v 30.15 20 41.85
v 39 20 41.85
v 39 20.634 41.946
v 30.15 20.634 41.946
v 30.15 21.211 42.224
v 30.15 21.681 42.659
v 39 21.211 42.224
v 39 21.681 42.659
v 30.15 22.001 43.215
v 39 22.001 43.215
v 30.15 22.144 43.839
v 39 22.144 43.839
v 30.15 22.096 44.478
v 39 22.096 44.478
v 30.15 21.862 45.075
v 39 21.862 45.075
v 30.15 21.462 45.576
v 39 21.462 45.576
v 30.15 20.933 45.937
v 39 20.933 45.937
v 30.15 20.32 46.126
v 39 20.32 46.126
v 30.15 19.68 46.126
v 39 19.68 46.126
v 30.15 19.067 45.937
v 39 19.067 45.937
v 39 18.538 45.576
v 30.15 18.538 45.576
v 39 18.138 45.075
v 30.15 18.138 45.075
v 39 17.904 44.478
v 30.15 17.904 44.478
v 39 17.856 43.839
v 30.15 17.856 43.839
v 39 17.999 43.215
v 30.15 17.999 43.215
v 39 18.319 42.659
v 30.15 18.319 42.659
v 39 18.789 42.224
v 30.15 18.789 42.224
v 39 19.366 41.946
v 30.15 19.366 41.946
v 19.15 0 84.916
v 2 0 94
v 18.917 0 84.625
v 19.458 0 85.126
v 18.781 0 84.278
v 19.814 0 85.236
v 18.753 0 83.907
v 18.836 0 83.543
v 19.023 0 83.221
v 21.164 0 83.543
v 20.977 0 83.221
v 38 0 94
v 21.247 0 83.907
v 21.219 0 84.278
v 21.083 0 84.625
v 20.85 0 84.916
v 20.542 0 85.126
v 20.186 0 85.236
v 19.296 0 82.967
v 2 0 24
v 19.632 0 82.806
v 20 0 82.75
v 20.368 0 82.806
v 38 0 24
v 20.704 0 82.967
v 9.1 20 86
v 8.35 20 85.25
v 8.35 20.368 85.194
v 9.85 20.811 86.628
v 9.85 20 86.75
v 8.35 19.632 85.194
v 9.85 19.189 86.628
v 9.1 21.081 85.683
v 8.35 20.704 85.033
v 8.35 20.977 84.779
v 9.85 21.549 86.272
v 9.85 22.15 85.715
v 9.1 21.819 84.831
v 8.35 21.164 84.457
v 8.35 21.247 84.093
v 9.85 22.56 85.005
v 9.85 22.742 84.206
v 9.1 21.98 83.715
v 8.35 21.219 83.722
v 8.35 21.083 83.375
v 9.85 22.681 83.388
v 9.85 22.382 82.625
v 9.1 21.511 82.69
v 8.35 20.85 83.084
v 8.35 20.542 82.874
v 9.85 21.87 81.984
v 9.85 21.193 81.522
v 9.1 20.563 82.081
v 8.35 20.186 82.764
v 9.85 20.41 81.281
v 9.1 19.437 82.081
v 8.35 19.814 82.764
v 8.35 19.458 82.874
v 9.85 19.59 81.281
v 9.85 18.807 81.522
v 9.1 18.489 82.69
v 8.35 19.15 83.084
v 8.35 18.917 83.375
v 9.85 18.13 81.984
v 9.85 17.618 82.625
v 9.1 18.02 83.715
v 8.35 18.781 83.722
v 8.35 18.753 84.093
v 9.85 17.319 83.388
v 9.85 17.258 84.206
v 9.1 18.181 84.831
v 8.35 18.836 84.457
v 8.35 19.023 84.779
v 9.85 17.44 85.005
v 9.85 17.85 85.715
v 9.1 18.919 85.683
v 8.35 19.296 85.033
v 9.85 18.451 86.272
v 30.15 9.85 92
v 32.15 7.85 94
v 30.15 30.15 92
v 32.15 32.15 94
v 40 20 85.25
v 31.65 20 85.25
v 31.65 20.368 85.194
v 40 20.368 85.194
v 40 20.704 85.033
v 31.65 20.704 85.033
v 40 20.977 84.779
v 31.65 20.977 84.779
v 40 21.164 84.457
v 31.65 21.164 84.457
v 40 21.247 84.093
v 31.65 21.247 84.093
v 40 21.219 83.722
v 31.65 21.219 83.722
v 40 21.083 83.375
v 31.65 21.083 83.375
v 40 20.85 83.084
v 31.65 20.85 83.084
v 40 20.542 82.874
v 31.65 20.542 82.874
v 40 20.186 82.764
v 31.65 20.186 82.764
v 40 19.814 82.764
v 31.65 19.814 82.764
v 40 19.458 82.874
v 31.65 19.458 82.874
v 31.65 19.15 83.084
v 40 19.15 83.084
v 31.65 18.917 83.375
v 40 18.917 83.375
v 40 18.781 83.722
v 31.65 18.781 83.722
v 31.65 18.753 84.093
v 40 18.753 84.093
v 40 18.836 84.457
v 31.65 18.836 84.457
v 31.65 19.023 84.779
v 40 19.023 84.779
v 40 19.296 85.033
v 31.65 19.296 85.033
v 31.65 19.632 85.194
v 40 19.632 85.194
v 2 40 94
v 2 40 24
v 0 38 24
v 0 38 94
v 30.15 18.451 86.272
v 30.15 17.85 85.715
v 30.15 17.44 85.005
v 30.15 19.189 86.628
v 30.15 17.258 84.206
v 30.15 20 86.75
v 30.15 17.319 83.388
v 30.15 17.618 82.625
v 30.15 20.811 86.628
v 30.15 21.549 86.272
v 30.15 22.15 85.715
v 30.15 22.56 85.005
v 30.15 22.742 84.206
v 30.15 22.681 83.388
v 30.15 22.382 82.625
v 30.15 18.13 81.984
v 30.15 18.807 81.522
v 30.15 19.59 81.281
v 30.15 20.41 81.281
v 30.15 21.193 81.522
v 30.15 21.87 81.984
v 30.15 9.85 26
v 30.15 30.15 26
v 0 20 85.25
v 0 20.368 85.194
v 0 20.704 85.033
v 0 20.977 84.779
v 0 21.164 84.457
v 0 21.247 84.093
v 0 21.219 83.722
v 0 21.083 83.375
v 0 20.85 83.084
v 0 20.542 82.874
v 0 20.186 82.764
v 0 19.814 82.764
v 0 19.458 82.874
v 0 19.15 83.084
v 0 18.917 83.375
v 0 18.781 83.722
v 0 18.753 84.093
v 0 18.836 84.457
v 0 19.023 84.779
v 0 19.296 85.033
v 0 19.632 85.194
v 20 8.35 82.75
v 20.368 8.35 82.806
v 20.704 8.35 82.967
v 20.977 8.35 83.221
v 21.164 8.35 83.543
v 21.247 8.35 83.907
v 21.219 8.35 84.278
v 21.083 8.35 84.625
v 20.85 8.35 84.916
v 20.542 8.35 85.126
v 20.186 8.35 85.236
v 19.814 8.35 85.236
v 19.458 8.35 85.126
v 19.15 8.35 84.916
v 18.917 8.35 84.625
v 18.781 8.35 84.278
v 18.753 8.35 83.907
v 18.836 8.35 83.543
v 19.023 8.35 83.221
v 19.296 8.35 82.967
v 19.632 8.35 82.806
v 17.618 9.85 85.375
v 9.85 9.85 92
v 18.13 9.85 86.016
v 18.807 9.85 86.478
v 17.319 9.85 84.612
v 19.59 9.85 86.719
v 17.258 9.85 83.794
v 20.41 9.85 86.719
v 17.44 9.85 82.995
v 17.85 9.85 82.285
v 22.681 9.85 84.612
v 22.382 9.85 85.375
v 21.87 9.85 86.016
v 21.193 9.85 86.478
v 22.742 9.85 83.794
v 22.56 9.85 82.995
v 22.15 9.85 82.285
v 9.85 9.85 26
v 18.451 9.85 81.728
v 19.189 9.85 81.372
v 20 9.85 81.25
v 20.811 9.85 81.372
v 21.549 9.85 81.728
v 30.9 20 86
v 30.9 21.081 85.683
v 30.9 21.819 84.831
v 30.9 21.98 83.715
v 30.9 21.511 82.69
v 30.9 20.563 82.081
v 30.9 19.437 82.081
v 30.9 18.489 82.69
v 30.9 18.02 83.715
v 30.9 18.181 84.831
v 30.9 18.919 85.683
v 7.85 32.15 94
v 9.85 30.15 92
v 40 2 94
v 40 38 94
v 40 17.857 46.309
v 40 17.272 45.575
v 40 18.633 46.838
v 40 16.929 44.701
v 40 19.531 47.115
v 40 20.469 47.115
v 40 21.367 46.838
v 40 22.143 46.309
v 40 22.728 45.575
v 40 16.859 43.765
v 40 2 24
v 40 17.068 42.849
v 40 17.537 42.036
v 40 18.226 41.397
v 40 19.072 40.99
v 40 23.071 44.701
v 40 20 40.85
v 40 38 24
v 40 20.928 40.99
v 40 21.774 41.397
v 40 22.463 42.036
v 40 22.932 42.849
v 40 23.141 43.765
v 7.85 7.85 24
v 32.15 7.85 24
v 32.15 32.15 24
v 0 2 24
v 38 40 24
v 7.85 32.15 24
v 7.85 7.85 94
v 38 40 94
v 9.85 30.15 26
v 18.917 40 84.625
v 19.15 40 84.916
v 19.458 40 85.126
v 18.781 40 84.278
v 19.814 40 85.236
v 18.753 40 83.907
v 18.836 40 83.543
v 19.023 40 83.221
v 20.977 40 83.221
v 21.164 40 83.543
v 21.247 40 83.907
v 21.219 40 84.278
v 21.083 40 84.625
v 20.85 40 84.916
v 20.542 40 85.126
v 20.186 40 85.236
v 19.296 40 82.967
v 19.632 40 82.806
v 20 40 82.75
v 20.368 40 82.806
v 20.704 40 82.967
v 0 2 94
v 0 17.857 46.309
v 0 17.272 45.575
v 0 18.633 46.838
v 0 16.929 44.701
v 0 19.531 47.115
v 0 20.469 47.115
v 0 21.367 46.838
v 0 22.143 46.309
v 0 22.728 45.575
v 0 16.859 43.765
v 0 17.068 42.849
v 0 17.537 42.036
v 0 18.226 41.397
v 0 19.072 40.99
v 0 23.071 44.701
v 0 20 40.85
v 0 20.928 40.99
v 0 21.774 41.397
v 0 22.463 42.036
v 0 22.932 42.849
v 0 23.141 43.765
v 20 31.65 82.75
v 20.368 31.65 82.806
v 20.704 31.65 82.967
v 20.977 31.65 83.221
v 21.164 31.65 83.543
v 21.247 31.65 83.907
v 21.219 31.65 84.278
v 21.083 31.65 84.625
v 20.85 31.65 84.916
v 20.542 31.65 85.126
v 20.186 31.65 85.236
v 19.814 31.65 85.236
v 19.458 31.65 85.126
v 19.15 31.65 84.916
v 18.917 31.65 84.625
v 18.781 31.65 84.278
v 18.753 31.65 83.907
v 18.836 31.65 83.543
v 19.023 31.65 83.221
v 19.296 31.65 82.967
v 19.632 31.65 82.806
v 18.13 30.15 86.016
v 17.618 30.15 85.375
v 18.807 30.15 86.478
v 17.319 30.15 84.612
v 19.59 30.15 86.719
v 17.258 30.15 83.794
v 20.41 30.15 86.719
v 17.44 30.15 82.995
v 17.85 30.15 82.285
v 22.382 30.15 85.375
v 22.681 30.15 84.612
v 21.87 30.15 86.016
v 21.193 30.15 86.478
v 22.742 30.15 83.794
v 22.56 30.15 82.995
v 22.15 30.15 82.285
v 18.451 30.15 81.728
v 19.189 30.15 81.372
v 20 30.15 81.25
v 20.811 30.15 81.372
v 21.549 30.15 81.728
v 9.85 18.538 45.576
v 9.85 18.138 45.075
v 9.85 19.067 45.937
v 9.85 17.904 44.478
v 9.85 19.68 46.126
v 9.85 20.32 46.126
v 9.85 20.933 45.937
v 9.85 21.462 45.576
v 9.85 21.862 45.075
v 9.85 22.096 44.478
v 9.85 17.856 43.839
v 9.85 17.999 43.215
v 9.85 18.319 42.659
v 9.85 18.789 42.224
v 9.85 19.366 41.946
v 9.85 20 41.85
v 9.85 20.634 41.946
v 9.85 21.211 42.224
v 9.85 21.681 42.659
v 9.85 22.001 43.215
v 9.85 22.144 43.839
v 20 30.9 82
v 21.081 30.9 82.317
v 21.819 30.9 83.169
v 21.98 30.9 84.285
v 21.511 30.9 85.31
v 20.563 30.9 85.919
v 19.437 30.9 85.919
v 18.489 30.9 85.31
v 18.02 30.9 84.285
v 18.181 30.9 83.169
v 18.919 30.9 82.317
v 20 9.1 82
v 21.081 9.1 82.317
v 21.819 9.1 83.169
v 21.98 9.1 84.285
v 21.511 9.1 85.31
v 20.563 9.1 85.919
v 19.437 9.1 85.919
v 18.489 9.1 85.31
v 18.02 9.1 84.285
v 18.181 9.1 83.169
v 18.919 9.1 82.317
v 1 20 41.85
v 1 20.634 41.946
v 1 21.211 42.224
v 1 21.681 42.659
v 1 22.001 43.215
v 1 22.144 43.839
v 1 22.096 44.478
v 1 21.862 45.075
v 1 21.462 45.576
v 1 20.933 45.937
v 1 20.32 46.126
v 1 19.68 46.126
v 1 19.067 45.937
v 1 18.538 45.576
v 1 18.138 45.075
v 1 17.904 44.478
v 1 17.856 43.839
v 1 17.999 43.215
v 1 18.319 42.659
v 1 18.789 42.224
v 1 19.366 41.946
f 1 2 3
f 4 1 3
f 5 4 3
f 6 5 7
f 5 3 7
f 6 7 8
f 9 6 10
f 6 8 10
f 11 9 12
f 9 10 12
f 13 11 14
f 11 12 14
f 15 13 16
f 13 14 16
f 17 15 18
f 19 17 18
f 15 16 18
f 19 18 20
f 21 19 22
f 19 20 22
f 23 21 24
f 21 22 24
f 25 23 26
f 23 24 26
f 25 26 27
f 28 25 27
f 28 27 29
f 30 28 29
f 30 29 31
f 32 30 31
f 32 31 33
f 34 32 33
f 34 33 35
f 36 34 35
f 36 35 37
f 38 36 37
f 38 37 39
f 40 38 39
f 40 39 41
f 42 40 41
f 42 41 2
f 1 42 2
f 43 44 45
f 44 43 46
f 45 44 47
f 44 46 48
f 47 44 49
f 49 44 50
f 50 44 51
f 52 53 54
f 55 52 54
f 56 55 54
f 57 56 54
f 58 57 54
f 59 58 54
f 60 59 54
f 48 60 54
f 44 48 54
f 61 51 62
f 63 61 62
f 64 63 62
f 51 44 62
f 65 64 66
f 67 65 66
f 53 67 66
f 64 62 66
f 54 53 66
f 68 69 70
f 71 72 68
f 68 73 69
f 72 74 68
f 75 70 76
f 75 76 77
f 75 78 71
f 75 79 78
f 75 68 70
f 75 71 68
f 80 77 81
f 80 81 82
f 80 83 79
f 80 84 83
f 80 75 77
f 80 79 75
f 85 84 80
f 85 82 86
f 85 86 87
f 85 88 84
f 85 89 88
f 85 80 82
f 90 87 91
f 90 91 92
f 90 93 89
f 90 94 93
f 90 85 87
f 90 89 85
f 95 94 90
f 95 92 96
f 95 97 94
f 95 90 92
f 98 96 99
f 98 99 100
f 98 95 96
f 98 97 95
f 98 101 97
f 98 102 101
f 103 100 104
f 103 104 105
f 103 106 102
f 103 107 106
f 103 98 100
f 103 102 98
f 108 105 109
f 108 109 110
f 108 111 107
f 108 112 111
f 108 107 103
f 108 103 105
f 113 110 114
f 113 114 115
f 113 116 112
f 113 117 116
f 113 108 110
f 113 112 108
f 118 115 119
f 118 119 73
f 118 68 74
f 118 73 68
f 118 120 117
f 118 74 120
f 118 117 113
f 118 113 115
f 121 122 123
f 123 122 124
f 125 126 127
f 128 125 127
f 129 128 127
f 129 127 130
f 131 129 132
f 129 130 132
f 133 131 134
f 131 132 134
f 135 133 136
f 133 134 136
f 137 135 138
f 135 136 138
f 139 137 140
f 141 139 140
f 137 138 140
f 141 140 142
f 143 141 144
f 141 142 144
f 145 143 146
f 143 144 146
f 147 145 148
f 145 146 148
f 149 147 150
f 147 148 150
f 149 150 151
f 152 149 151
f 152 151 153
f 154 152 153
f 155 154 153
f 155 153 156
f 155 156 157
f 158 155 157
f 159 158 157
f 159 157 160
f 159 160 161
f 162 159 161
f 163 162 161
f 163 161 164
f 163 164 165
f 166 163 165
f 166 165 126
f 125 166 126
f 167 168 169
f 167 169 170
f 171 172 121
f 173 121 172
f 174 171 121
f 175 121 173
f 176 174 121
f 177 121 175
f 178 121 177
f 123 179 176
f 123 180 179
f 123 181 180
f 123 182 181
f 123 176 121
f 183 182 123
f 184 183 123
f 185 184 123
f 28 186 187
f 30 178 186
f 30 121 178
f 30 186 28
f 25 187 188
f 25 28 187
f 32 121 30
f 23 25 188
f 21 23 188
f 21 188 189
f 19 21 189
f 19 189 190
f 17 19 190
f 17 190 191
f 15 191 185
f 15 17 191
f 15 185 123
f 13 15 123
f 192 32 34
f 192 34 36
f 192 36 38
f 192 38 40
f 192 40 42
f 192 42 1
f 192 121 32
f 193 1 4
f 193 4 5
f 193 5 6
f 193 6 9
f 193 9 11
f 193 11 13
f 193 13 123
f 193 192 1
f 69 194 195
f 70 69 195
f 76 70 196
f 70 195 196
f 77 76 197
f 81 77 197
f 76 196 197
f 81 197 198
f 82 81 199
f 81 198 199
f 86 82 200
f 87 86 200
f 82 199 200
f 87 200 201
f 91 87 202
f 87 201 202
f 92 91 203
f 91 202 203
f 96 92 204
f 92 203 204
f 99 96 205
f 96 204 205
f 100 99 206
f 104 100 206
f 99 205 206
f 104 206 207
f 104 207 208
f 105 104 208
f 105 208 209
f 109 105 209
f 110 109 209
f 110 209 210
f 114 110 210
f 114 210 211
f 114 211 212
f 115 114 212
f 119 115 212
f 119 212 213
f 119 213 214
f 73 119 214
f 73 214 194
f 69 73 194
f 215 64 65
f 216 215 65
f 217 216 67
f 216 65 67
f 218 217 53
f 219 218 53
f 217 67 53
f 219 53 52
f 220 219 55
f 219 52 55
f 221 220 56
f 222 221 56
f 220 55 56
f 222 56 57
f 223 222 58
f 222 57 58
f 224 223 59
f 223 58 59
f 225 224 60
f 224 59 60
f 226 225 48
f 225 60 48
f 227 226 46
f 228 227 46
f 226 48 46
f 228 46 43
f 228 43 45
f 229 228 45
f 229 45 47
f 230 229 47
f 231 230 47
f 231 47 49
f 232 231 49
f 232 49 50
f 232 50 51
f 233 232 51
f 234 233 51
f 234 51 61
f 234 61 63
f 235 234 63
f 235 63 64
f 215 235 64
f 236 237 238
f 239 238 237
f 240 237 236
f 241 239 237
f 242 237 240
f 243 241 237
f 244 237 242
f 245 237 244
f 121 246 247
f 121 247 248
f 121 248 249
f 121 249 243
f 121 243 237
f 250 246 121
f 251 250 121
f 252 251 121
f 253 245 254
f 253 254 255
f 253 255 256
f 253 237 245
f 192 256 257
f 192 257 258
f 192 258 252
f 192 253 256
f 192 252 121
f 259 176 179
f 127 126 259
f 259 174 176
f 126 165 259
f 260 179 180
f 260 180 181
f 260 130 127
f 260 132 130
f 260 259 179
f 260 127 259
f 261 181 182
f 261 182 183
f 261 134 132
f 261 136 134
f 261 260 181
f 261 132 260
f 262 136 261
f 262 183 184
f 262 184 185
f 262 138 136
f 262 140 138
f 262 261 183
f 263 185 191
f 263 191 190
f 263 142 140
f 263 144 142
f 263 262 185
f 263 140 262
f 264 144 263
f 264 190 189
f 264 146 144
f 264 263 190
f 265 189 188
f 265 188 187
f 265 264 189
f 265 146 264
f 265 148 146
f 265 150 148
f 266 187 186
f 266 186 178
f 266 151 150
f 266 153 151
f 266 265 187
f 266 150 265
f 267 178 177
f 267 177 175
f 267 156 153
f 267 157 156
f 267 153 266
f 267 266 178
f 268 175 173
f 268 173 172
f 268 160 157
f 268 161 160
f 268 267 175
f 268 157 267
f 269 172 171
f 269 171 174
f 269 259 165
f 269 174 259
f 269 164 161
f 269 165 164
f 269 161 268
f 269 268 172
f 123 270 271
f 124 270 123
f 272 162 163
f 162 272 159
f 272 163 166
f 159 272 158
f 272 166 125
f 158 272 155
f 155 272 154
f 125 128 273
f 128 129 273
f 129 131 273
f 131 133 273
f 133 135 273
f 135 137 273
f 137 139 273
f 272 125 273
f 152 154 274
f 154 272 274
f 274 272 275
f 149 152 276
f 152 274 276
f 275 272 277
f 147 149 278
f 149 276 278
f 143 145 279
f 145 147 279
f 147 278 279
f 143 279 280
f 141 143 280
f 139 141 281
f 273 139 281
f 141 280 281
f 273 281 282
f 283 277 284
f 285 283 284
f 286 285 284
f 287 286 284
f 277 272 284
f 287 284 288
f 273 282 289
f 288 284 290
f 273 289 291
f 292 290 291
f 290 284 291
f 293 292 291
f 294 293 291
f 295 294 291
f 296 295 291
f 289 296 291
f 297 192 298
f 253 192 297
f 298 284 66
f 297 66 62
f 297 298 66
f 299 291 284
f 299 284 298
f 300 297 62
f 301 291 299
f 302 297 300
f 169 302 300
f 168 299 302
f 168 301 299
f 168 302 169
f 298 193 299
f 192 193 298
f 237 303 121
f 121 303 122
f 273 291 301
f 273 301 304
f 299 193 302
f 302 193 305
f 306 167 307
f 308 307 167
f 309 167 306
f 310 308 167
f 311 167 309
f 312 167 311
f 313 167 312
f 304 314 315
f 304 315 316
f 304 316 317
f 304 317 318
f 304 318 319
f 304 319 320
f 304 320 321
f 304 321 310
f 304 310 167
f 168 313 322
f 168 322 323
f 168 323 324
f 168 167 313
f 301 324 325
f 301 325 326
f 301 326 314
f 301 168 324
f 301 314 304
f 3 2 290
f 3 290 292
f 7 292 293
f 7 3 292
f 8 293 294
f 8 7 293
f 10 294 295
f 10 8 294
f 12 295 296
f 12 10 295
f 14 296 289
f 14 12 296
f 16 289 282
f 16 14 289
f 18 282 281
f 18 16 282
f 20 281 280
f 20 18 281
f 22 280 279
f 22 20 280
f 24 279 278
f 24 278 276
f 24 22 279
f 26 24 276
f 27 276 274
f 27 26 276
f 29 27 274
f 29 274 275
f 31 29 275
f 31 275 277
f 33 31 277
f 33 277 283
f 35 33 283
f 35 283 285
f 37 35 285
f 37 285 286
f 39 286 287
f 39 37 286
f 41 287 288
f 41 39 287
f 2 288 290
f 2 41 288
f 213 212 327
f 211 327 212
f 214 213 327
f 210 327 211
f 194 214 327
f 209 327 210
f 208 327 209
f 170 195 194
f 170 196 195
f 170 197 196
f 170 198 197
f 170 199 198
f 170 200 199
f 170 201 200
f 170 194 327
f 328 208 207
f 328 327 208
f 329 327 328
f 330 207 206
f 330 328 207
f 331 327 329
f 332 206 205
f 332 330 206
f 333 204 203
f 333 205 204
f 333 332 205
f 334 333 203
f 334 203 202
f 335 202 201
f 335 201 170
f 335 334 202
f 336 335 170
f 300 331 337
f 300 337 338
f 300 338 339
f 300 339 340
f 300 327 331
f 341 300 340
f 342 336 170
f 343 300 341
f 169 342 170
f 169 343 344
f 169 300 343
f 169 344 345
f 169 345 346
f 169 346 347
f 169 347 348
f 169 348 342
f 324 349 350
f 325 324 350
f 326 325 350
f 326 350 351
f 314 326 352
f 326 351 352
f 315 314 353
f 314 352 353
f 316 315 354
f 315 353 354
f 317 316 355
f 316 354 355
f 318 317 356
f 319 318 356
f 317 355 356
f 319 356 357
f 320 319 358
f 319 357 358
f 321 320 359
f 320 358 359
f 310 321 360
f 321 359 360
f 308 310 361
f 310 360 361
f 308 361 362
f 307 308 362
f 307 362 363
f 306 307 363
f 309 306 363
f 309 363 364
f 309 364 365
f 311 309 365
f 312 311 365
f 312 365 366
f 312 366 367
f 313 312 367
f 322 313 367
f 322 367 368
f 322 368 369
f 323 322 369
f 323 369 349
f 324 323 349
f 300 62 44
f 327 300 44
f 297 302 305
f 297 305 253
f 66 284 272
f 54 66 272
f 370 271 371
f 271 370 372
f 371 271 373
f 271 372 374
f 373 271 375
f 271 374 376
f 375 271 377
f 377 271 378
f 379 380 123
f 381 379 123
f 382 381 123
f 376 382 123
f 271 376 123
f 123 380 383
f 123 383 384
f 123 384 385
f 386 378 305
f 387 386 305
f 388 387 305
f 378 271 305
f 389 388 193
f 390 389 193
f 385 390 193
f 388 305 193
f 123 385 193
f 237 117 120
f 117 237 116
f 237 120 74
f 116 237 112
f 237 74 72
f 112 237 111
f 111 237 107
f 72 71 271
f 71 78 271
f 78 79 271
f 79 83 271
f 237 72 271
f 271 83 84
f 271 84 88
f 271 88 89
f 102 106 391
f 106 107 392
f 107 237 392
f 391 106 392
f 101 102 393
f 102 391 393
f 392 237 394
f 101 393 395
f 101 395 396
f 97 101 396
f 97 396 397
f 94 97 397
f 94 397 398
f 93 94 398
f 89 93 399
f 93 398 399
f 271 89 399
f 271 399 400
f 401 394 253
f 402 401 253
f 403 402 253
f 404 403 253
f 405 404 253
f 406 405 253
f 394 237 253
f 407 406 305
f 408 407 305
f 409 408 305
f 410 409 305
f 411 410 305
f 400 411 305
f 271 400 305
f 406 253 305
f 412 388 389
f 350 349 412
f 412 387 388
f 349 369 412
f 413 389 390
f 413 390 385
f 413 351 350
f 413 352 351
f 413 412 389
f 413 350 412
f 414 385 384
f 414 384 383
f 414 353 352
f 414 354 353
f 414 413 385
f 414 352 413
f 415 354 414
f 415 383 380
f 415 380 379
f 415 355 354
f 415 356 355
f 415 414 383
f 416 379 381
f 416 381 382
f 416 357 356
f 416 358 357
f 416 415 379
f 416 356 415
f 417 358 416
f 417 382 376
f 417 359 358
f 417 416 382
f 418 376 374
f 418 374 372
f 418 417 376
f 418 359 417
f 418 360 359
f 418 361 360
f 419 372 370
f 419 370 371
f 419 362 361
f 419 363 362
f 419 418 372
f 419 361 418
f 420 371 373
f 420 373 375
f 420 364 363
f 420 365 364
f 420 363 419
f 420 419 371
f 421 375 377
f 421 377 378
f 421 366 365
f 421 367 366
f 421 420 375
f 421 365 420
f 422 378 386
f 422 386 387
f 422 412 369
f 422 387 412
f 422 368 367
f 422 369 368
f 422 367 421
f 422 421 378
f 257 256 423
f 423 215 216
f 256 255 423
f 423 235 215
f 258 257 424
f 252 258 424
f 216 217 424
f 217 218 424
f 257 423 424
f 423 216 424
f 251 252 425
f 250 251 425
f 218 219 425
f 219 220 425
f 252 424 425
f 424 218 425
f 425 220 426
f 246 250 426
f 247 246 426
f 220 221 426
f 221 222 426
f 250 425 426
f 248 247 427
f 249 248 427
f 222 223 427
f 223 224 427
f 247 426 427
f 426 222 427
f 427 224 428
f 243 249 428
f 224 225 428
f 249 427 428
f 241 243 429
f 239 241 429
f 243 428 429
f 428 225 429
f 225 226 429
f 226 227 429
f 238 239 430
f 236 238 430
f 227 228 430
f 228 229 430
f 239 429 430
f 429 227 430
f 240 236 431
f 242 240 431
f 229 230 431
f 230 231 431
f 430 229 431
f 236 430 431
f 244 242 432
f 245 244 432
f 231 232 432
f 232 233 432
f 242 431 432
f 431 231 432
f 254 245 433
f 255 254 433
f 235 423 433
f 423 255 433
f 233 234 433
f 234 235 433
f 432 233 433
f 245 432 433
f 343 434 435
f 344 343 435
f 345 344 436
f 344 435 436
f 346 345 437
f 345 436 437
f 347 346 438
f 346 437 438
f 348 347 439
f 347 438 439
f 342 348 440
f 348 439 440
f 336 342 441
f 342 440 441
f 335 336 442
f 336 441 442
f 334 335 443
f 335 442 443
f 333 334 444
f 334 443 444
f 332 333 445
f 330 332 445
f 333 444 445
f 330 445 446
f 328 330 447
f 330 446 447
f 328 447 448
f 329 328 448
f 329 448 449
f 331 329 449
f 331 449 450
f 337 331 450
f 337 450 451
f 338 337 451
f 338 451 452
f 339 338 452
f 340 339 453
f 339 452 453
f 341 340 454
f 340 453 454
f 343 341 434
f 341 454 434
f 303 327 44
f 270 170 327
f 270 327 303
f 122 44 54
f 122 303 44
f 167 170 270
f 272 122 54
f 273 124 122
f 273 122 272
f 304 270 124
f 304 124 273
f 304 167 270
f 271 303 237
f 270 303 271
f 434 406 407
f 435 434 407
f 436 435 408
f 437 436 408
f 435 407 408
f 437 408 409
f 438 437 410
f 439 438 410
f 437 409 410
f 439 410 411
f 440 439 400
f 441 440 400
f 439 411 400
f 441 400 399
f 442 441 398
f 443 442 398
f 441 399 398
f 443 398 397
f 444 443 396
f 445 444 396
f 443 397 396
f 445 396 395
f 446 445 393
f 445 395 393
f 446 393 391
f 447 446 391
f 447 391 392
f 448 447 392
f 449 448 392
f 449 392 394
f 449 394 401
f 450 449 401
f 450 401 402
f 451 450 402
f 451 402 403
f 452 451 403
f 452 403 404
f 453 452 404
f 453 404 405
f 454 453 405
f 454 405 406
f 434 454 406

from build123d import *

# Parameters (mm, degrees)
SKETCH_2_W          = 40
SKETCH_2_H          = 40
SKETCH_2_W_2        = 20.3
SKETCH_2_H_2        = 20.3
EXTRUDE_1_DEPTH     = 94
CHAMFER_1_SIZE      = 2
CHAMFER_2_SIZE      = 2
SKETCH_5_R          = 1.25
CUT_EXTRUDE_2_DEPTH = 48
SKETCH_7_R          = 2.15
CUT_EXTRUDE_4_DEPTH = 79
CHAMFER_6_SIZE      = 1
SKETCH_8_W          = 65.895062616
SKETCH_8_H          = 54.143076927
CUT_EXTRUDE_5_DEPTH = 24
SKETCH_9_R          = 1.25
CUT_EXTRUDE_6_DEPTH = 49
CHAMFER_7_SIZE      = 1.5
CHAMFER_8_SIZE      = 2


with BuildPart() as part:
    # 草图2 → 凸台-拉伸1 (new body)
    with BuildSketch(Plane.XY):
        with Locations((20, 20)):
            Rectangle(SKETCH_2_W, SKETCH_2_H)
        with Locations((20, 20)):
            Rectangle(SKETCH_2_W_2, SKETCH_2_H_2, mode=Mode.SUBTRACT)
    extrude(amount=EXTRUDE_1_DEPTH)

    # 倒角1
    chamfer_1_edges = [part.edges().sort_by_distance(p)[0] for p in [
        (9.85, 20, 94),
        (20, 9.85, 94),
        (30.15, 20, 94),
        (20, 30.15, 94),
    ]]
    chamfer(chamfer_1_edges, length=CHAMFER_1_SIZE)

    # 倒角2
    chamfer_2_edges = [part.edges().sort_by_distance(p)[0] for p in [
        (0, 40, 47),
        (40, 40, 47),
        (40, 0, 47),
        (0, 0, 47),
    ]]
    chamfer(chamfer_2_edges, length=CHAMFER_2_SIZE)

    # 草图5 → 切除-拉伸2 (cut)
    with BuildSketch(Plane.XZ):
        with Locations(Location((20, 84, 0), (0, 0, 270))):
            Circle(SKETCH_5_R)
    extrude(amount=-CUT_EXTRUDE_2_DEPTH, mode=Mode.SUBTRACT)

    # 草图7 → 切除-拉伸4 (cut)
    with BuildSketch(Plane(origin=(40, 0, 0), x_dir=(0, 0, -1), z_dir=(1, 0, 0))):
        with Locations((-44, 20)):
            Circle(SKETCH_7_R)
    extrude(amount=-CUT_EXTRUDE_4_DEPTH, mode=Mode.SUBTRACT)

    # 倒角6
    chamfer_6_edges = [part.edges().sort_by_distance(p)[0] for p in [
        (0, 20, 46.15),
        (40, 20, 46.15),
    ]]
    chamfer(chamfer_6_edges, length=CHAMFER_6_SIZE)

    # 草图8 → 切除-拉伸5 (cut)
    with BuildSketch(Plane(origin=(0, 0, 0), x_dir=(-1, 0, 0), z_dir=(0, 0, -1))):
        with Locations((-18.489087128, 17.145946332)):
            Rectangle(SKETCH_8_W, SKETCH_8_H)
    extrude(amount=-CUT_EXTRUDE_5_DEPTH, mode=Mode.SUBTRACT)

    # 草图9 → 切除-拉伸6 (cut)
    with BuildSketch(Plane.ZY):
        with Locations((84, 20)):
            Circle(SKETCH_9_R)
    extrude(amount=-CUT_EXTRUDE_6_DEPTH, mode=Mode.SUBTRACT)

    # 倒角7
    chamfer_7_edges = [part.edges().sort_by_distance(p)[0] for p in [
        (30.15, 20, 82.75),
        (9.85, 20, 82.75),
        (20, 30.15, 85.25),
        (20, 9.85, 85.25),
    ]]
    chamfer(chamfer_7_edges, length=CHAMFER_7_SIZE)

    # 倒角8
    chamfer_8_edges = [part.edges().sort_by_distance(p)[0] for p in [
        (20, 9.85, 24),
        (9.85, 20, 24),
        (20, 30.15, 24),
        (30.15, 20, 24),
    ]]
    chamfer(chamfer_8_edges, length=CHAMFER_8_SIZE)


solid = part.part
